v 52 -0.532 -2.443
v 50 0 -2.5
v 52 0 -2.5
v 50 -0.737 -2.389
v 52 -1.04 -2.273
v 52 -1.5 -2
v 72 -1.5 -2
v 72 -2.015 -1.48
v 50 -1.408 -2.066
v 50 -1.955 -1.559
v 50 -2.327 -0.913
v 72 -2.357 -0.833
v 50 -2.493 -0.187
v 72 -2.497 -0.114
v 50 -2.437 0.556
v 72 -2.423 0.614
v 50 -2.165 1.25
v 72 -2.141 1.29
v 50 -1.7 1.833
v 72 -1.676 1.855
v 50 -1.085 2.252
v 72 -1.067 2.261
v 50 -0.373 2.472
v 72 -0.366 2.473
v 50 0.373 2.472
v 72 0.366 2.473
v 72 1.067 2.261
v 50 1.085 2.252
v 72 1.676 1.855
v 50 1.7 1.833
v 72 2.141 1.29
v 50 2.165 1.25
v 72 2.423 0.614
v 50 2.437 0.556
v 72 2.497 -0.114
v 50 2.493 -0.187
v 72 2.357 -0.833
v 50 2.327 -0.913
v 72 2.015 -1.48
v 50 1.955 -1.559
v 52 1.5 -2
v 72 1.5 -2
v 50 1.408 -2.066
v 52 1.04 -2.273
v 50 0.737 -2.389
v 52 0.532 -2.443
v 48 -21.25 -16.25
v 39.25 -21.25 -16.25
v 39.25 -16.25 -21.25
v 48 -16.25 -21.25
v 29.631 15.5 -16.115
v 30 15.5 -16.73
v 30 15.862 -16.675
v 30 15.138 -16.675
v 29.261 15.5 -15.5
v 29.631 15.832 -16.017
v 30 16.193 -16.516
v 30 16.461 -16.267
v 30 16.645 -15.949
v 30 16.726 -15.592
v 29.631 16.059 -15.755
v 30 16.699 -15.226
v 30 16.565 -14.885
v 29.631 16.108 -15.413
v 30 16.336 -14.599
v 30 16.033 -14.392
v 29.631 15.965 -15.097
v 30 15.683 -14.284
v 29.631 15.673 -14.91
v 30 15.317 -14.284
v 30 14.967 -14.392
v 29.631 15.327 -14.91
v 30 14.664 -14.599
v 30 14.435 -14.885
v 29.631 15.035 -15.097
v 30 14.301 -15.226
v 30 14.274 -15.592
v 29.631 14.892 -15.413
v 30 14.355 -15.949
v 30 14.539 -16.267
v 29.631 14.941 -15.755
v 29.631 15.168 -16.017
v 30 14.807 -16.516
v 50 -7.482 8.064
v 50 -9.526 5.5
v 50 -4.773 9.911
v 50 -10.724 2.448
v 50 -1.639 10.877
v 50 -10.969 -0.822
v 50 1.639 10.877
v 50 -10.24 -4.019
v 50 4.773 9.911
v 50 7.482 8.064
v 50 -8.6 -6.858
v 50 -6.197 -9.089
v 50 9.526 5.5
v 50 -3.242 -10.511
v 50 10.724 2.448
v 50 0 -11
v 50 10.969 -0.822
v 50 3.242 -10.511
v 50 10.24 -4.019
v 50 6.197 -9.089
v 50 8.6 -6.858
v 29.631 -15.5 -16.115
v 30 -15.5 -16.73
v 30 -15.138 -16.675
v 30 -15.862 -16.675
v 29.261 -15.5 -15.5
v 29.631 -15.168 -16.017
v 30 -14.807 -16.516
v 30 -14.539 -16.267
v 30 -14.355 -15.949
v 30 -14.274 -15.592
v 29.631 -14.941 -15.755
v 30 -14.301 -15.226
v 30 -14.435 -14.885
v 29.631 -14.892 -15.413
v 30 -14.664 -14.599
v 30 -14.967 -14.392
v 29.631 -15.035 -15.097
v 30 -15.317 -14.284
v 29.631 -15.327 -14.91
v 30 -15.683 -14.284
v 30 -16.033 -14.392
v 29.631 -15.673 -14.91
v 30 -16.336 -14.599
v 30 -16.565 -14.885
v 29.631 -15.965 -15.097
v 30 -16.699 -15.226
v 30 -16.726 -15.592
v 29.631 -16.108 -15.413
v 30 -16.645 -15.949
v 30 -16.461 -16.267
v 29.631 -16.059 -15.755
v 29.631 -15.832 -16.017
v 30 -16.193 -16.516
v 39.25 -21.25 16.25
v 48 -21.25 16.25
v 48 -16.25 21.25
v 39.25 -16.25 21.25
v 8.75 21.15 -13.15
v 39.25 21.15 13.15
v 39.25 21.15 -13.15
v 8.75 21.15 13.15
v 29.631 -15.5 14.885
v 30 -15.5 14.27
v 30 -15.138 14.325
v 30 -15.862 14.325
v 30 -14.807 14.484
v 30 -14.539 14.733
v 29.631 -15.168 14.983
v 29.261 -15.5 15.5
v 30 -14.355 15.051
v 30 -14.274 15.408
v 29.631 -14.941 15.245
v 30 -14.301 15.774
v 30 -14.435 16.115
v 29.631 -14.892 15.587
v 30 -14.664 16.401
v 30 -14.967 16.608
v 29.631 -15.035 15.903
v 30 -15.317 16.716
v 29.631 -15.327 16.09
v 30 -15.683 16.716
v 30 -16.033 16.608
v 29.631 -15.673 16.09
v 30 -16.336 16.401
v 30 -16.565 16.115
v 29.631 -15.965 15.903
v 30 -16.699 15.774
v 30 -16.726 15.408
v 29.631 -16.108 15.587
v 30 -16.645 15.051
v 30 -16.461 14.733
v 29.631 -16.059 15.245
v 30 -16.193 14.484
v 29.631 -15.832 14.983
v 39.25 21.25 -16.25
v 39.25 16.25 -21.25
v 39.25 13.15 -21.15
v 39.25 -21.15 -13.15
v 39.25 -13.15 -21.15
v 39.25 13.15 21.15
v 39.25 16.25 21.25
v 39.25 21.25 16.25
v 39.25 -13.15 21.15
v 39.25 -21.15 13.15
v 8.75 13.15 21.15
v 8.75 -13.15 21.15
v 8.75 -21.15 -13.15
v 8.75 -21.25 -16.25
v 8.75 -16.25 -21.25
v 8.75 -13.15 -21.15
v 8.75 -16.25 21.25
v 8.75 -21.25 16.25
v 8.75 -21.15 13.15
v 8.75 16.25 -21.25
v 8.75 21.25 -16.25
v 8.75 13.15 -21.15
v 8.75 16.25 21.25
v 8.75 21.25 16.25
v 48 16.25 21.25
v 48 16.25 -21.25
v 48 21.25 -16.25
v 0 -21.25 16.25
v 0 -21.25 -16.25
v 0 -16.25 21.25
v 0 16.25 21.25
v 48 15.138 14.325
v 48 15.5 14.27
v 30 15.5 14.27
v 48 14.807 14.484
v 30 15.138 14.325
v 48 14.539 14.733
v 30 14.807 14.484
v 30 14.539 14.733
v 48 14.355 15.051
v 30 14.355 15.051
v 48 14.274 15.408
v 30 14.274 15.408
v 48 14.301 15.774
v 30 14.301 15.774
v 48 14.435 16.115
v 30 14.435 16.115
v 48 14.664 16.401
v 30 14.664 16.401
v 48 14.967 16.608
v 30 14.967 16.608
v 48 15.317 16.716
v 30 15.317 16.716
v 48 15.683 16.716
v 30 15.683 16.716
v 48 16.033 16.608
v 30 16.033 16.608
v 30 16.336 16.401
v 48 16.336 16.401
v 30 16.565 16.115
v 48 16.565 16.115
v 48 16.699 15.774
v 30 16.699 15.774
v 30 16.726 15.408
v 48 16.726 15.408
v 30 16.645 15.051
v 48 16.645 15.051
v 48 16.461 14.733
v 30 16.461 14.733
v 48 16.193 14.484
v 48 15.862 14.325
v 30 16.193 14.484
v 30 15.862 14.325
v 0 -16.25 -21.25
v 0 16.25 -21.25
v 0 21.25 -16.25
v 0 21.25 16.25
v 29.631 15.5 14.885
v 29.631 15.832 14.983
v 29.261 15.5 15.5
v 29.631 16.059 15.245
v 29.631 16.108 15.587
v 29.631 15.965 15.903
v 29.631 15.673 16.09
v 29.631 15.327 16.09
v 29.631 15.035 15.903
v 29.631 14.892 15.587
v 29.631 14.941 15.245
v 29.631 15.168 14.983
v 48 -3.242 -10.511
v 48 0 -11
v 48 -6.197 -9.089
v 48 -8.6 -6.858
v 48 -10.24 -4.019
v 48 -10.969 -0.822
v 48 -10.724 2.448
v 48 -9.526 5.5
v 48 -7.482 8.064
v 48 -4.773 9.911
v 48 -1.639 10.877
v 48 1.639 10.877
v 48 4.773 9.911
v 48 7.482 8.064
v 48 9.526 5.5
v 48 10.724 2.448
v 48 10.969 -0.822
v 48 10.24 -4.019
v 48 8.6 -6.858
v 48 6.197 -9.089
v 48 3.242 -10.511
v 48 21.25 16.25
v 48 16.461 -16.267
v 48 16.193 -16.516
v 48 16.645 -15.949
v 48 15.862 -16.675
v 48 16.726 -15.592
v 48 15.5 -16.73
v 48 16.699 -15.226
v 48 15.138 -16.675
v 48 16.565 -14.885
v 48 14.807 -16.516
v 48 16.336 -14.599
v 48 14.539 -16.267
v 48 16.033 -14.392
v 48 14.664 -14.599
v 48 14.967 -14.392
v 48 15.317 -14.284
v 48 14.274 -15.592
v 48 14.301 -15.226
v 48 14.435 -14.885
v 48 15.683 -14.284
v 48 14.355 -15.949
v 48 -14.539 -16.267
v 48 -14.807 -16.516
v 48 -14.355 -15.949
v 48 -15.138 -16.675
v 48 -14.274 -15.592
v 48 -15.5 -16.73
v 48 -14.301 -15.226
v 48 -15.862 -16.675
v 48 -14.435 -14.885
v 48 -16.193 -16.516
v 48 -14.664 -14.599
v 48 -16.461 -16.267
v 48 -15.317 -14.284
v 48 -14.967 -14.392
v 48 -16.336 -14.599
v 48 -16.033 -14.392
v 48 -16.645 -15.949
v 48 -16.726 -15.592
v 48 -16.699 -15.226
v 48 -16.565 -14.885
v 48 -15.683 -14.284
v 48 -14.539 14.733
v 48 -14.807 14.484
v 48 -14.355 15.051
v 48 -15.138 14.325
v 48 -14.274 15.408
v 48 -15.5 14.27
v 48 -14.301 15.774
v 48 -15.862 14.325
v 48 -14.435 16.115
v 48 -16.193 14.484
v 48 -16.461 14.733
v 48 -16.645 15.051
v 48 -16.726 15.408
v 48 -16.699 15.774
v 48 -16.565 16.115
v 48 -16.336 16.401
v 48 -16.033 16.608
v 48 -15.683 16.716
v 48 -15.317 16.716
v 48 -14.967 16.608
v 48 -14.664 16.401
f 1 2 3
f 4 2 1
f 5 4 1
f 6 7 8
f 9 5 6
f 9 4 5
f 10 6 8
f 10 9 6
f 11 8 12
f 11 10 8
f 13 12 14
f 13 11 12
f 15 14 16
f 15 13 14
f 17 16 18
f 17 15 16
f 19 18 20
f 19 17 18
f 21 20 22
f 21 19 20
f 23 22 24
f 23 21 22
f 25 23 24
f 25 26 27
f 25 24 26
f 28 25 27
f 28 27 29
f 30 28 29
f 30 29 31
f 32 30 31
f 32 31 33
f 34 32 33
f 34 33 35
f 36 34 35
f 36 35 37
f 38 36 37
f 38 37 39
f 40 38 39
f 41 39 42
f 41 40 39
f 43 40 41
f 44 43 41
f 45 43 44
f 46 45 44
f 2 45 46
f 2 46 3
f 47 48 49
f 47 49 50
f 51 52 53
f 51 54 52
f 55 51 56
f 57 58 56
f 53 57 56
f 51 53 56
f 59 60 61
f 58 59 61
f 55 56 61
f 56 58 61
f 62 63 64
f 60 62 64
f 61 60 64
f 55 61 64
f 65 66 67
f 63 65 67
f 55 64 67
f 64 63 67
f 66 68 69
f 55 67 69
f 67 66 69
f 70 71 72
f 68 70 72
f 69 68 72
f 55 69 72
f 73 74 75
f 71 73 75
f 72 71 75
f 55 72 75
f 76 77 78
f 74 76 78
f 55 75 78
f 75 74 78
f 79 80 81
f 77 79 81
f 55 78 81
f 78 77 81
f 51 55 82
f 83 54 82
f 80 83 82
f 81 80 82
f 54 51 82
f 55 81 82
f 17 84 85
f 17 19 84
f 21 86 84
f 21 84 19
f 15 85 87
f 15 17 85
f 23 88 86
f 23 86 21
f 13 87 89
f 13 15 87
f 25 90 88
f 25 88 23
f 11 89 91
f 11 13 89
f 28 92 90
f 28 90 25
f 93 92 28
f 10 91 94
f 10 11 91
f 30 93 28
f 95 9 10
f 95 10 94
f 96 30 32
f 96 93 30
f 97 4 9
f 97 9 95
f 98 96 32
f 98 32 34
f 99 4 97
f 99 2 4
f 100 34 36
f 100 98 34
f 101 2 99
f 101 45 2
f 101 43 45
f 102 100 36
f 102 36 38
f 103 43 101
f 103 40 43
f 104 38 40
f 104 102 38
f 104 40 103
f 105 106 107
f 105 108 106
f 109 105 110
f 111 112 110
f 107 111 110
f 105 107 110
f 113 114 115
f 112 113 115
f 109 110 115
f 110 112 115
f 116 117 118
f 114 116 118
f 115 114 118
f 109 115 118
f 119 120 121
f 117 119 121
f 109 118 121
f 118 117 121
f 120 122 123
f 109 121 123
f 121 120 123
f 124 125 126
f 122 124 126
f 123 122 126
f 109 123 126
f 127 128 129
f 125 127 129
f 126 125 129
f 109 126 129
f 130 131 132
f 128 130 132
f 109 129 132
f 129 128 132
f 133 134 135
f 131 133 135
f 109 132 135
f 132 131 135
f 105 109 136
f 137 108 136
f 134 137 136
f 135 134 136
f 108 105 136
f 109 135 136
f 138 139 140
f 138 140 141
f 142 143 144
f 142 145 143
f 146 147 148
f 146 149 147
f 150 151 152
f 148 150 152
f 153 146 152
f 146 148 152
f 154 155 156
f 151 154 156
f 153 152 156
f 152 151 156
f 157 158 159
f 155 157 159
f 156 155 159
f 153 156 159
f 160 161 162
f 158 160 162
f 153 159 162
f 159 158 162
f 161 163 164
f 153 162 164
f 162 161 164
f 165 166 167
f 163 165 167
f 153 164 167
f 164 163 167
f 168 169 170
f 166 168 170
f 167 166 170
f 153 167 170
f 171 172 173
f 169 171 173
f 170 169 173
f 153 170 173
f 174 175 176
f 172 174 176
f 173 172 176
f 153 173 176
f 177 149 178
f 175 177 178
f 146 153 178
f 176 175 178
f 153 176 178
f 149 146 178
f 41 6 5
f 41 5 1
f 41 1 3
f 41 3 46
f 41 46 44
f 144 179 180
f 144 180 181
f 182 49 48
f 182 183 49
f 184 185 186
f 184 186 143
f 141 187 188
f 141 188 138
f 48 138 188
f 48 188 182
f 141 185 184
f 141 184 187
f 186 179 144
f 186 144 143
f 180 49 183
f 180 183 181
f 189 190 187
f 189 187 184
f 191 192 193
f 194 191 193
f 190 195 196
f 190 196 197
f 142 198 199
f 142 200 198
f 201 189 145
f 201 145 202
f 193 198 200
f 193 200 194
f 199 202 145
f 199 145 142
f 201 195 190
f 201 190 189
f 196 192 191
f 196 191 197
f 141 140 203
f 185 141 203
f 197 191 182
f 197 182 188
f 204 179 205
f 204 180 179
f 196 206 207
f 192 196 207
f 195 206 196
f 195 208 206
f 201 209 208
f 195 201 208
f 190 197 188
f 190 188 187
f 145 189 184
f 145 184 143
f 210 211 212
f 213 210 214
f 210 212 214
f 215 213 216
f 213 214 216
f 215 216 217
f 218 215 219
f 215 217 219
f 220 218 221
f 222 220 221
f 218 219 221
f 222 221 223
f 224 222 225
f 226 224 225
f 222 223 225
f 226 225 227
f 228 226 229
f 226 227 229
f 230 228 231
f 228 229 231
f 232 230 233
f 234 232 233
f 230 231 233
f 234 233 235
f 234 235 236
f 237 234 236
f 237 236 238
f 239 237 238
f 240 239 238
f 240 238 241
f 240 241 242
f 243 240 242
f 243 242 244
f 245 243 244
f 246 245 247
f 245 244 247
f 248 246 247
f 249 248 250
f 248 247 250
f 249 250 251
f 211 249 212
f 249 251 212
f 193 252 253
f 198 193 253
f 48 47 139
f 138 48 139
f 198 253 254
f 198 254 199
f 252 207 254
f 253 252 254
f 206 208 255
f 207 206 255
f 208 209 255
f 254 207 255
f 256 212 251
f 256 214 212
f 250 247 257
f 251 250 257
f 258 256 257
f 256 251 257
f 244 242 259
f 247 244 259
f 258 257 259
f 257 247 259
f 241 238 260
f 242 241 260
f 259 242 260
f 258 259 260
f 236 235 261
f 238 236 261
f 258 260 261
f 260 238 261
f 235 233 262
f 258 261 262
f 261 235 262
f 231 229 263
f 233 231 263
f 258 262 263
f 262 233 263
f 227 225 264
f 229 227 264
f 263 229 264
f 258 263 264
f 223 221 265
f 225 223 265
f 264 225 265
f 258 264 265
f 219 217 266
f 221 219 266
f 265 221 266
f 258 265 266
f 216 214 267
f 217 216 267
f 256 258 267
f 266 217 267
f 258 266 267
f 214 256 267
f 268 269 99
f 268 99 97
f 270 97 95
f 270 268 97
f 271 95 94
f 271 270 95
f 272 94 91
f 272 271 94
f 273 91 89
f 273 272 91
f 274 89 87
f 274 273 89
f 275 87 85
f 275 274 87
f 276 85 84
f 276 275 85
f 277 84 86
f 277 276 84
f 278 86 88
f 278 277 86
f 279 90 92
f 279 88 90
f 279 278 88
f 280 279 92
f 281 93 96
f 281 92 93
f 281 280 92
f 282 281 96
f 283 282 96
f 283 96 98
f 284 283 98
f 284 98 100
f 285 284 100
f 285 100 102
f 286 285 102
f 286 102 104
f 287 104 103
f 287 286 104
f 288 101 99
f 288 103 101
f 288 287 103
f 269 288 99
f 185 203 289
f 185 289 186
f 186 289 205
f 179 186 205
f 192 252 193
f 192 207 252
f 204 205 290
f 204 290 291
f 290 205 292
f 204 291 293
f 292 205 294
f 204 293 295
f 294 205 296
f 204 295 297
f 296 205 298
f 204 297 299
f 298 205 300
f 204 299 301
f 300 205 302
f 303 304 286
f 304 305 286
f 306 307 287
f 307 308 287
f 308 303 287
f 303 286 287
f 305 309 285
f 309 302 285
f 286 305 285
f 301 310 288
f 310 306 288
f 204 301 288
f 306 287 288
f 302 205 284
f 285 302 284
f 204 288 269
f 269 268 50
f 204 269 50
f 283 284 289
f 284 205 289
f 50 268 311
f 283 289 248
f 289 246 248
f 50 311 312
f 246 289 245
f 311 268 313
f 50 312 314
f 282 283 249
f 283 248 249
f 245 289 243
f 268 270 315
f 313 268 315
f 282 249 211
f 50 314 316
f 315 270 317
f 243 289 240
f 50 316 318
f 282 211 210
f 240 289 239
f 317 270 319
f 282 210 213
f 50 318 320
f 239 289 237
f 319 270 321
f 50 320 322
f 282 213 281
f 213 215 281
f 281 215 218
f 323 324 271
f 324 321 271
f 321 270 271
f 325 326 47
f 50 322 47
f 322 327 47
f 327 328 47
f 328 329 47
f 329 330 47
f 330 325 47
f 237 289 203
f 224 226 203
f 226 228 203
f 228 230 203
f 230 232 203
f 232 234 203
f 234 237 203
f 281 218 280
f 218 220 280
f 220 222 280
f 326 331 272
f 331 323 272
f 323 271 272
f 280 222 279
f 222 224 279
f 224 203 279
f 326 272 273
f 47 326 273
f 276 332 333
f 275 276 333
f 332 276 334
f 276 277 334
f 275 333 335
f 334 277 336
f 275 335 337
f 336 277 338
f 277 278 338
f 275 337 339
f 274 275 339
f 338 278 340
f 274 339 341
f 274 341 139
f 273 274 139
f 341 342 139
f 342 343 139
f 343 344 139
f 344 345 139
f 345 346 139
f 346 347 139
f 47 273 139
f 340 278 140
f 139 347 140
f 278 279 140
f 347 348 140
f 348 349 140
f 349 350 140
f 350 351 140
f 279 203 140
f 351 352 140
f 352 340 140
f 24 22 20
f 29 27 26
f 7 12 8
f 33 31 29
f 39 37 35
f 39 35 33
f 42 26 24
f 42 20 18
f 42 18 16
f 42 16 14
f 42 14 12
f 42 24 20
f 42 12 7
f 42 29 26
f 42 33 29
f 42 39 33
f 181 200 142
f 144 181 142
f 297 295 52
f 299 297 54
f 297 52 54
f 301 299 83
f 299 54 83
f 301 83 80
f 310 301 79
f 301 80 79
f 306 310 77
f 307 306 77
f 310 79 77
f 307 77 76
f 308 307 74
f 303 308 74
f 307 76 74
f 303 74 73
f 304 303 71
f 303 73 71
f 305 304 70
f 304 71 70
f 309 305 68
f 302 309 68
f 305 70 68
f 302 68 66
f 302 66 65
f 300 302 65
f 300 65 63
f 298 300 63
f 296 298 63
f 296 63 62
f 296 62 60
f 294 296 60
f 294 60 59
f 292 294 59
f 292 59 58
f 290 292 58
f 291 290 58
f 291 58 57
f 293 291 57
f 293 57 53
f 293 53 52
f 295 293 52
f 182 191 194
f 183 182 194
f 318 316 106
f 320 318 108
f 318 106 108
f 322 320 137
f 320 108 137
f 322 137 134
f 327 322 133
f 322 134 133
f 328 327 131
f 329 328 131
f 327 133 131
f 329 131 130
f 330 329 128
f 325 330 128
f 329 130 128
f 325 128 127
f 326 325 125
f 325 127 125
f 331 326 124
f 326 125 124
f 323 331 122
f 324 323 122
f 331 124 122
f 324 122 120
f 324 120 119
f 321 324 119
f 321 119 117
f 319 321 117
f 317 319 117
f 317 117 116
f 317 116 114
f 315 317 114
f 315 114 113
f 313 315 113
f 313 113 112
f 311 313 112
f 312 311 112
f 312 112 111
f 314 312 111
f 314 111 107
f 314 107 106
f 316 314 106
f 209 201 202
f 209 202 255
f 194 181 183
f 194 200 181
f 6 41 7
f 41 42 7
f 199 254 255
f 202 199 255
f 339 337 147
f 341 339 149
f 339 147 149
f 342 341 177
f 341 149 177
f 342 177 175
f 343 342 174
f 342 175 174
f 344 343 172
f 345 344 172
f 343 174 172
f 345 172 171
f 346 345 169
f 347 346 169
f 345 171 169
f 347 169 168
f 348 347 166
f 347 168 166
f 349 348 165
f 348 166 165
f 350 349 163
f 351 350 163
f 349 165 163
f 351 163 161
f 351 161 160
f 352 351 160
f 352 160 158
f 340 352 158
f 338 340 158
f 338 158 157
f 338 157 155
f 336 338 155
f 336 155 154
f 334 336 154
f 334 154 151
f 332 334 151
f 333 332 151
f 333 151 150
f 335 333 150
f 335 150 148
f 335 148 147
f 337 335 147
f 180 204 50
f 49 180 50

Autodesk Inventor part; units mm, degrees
ref_plane "YZ Plane" through (0, 0, 0) normal (1, 0, 0) x (0, 1, 0)
ref_plane "XZ Plane" through (0, 0, 0) normal (0, 1, 0) x (-1, 0, 0)
sketch "Sketch1" plane through (0, 0, 0) normal (1, 0, 0) x (0, 1, 0)
  line L0 (21.25, 21.25) -> (-21.25, 21.25)
  line L1 (-21.25, 21.25) -> (-21.25, -21.25)
  line L2 (-21.25, -21.25) -> (21.25, -21.25)
  line L3 (21.25, -21.25) -> (21.25, 21.25)
  line L4 (21.25, 21.25) -> (-21.25, -21.25) construction
  line L5 (-21.25, 21.25) -> (21.25, -21.25) construction
  point P0 (0, 0)
  dimension "d0" = 42.5
  dimension "d1" = 42.5
extrude "Extrusion1" add sketch "Sketch1" along normal blind 8.75
chamfer "Chamfer1" distance 5 angle 45 4 edges at (4.375, 21.25, 21.25) (4.375, 21.25, -21.25) (4.375, -21.25, 21.25) (4.375, -21.25, -21.25)
sketch "Sketch2" plane through (8.75, 0, 0) normal (1, 0, 0) x (0, 0, -1)
  line L0 (21.15, -21.15) -> (-21.15, -21.15)
  line L1 (-21.15, -21.15) -> (-21.15, 21.15)
  line L2 (-21.15, 21.15) -> (21.15, 21.15)
  line L3 (21.15, 21.15) -> (21.15, -21.15)
  line L4 (21.15, -21.15) -> (-21.15, 21.15) construction
  line L5 (-21.15, -21.15) -> (21.15, 21.15) construction
  point P0 (0, 0)
  dimension "d7" = 42.3
  dimension "d8" = 42.3
extrude "Extrusion2" add sketch "Sketch2" along normal blind 30.5
chamfer "Chamfer2" distance 8 angle 45 4 edges at (24, 21.15, 21.15) (24, 21.15, -21.15) (24, -21.15, 21.15) (24, -21.15, -21.15)
ref_plane "Work Plane1" through (24, 0, 0) normal (1, 0, 0) x (0, 0, -1)
mirror "Mirror1" about plane through (24, 0, 0) normal (1, 0, 0) of "Extrusion1"
chamfer "Chamfer3" distance 5 angle 45 4 edges at (43.625, 21.25, -21.25) (43.625, -21.25, -21.25) (43.625, -21.25, 21.25) (43.625, 21.25, 21.25)
sketch "Sketch3" plane through (48, -16.25, 21.25) normal (1, 0, 0) x (0, 0, -1)
  point P0 (21.25, 16.25)
  point P1 (36.75, 31.75)
  point P2 (36.75, 0.75)
  point P3 (5.75, 0.75)
  point P4 (5.75, 31.75)
  dimension "d17" = 31
  dimension "d18" = 31
  dimension "d19" = 15.5
  dimension "d20" = 15.5
hole "Hole1" at (48, 15.5, -15.5) at (48, -15.5, -15.5) at (48, -15.5, 15.5) at (48, 15.5, 15.5) direction (-1, 0, 0) diameter 2.459 depth 18 tip angle 118 thread size "M3x0.5" class "6H" standard "ISO Metric profile"
sketch "Sketch4" plane through (48, -16.25, 21.25) normal (1, 0, 0) x (0, 0, -1)
  circle A0 centre (21.25, 16.25) radius 11
  dimension "d28" = 22
extrude "Extrusion3" add sketch "Sketch4" along normal blind 2
sketch "Sketch5" plane through (50, 0, 0) normal (1, 0, 0) x (0, 0, -1)
  circle A0 centre (0, 0) radius 2.5
  dimension "d31" = 5
extrude "Extrusion4" add sketch "Sketch5" along normal blind 22
sketch "Sketch6" plane through (72, 0, 0) normal (1, 0, 0) x (0, 0, -1)
  circle A0 centre (0, 0) radius 2.5 projected
  line L0 (2, 1.5) -> (2, -1.5)
  point P0 (2, 0)
  dimension "d34" = 2
extrude "Extrusion5" cut sketch "Sketch6" against normal blind 20 contours A0 L0 picked at (2.0912, -0.3466)
equation "\"d1\" = d0"
equation "\"d8\" = d7"
equation "\"d18\" = d17"
properties part number "HCMUTE-CDT23-OP_STEP-42"
